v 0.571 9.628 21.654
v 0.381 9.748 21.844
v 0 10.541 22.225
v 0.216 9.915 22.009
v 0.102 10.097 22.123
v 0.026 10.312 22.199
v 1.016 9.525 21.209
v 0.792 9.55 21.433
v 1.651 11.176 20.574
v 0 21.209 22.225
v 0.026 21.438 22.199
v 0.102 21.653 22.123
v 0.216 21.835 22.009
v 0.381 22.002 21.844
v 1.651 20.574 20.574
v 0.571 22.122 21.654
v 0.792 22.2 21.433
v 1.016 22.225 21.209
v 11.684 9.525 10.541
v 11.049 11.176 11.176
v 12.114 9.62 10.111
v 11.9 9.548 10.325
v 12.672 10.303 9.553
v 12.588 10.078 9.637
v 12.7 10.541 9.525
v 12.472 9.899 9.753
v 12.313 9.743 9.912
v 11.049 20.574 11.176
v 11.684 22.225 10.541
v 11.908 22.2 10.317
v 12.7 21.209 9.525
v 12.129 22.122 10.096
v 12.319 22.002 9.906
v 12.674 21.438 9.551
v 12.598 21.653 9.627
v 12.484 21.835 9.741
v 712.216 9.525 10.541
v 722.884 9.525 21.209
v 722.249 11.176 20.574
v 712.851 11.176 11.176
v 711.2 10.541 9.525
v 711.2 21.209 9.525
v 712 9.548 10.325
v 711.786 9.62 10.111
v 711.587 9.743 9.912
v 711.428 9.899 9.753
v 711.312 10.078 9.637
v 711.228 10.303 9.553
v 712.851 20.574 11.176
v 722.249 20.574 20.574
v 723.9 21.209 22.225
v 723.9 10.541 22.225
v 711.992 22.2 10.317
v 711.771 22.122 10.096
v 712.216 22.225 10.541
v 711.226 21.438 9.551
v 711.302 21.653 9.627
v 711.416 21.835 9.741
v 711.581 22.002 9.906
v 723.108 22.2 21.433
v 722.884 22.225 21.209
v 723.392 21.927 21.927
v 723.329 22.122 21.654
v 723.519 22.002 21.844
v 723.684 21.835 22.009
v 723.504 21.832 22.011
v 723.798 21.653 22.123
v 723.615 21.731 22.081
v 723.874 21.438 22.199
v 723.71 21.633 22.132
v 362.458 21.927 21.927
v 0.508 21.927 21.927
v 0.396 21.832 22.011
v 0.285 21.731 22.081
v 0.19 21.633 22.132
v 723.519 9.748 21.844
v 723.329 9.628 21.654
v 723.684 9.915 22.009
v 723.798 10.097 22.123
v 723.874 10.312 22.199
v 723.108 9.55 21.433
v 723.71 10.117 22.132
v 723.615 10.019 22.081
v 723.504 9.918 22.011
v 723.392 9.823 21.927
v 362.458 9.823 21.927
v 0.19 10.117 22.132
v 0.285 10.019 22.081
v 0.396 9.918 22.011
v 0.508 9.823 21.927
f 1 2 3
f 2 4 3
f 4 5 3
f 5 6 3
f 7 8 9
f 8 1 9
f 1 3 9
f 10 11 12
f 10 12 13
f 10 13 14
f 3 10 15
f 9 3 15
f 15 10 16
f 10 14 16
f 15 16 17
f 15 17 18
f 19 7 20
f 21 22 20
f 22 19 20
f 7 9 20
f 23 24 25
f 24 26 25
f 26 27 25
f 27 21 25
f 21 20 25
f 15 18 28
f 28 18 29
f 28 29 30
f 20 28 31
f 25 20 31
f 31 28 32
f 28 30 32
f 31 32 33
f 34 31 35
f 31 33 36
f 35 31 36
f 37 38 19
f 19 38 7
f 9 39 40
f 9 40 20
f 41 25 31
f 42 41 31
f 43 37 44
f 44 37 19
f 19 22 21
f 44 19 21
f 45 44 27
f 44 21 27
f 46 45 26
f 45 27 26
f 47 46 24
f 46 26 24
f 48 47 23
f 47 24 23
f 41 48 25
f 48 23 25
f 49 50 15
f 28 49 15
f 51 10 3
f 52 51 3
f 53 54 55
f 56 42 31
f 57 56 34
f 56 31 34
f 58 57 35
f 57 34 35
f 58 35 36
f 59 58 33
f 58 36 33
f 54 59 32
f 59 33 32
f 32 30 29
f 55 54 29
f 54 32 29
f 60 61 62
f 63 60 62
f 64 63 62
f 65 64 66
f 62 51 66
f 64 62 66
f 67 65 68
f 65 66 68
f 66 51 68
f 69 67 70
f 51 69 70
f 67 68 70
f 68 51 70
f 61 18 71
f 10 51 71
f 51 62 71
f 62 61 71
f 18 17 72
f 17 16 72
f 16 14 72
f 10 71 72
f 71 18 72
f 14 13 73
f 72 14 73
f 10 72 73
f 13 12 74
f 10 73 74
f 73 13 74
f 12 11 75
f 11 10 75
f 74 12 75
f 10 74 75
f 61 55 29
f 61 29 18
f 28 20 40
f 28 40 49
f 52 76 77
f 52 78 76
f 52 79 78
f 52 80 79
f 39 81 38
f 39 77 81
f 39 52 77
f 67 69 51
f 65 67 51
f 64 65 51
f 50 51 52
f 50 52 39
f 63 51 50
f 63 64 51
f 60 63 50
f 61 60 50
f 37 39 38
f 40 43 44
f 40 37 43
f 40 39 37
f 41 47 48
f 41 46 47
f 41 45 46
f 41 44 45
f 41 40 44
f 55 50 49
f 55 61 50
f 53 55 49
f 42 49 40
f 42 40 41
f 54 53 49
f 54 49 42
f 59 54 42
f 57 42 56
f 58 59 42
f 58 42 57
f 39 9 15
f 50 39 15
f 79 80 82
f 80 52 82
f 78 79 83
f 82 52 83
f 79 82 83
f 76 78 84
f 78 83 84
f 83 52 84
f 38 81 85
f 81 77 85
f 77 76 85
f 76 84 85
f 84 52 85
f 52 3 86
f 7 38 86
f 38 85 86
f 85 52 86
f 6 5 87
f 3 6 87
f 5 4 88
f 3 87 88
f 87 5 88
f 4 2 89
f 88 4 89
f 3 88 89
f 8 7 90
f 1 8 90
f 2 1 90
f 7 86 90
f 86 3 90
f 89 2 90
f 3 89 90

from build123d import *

# Parameters (mm, degrees)
SKETCH1_W           = 23.495
SKETCH1_H           = 23.495
BOSS_EXTRUDE1_DEPTH = 723.9
SCALE1_SCALE_X      = 1
SCALE1_SCALE_Y      = 0.4
SCALE1_SCALE_Z      = 0.4
CUT_EXTRUDE1_DEPTH  = 725.352435474


with BuildPart() as part:
    # Sketch1 → Boss-Extrude1 (new body)
    with BuildSketch(Plane(origin=(0, 0, 0), x_dir=(0, 0, -1), z_dir=(1, 0, 0))):
        with BuildLine():
            Line((0, 2.54), (0, 29.21))
            ThreePointArc((0, 29.21), (-0.743948776, 31.006051224), (-2.54, 31.75))
            Line((-2.54, 31.75), (-29.21, 31.75))
            ThreePointArc((-29.21, 31.75), (-31.006051224, 31.006051224), (-31.75, 29.21))
            Line((-31.75, 29.21), (-31.75, 2.54))
            ThreePointArc((-31.75, 2.54), (-31.006051224, 0.743948776), (-29.21, 0))
            Line((-29.21, 0), (-2.54, 0))
            ThreePointArc((-2.54, 0), (-0.743948776, 0.743948776), (0, 2.54))
        make_face()
        with Locations((-15.875, 15.875)):
            Rectangle(SKETCH1_W, SKETCH1_H, mode=Mode.SUBTRACT)
    extrude(amount=BOSS_EXTRUDE1_DEPTH)


with BuildPart() as part_1:
    # Scale1: scaled about (361.95, 15.875, 15.875)
    add(part.part.scale((SCALE1_SCALE_X, SCALE1_SCALE_Y, SCALE1_SCALE_Z), about=(361.95, 15.875, 15.875)))

    # Sketch3 → Cut-Extrude1 (cut, through all)
    with BuildSketch(Plane(origin=(0, 22.225, 0), x_dir=(1, 0, 0), z_dir=(0, 1, 0))):
        Polygon((0, -9.525), (0, -22.225), (12.7, -9.525), align=None)
        Polygon((723.9, -9.525), (723.9, -22.225), (711.2, -9.525), align=None)
    extrude(amount=-CUT_EXTRUDE1_DEPTH, mode=Mode.SUBTRACT)


solid = part_1.part
